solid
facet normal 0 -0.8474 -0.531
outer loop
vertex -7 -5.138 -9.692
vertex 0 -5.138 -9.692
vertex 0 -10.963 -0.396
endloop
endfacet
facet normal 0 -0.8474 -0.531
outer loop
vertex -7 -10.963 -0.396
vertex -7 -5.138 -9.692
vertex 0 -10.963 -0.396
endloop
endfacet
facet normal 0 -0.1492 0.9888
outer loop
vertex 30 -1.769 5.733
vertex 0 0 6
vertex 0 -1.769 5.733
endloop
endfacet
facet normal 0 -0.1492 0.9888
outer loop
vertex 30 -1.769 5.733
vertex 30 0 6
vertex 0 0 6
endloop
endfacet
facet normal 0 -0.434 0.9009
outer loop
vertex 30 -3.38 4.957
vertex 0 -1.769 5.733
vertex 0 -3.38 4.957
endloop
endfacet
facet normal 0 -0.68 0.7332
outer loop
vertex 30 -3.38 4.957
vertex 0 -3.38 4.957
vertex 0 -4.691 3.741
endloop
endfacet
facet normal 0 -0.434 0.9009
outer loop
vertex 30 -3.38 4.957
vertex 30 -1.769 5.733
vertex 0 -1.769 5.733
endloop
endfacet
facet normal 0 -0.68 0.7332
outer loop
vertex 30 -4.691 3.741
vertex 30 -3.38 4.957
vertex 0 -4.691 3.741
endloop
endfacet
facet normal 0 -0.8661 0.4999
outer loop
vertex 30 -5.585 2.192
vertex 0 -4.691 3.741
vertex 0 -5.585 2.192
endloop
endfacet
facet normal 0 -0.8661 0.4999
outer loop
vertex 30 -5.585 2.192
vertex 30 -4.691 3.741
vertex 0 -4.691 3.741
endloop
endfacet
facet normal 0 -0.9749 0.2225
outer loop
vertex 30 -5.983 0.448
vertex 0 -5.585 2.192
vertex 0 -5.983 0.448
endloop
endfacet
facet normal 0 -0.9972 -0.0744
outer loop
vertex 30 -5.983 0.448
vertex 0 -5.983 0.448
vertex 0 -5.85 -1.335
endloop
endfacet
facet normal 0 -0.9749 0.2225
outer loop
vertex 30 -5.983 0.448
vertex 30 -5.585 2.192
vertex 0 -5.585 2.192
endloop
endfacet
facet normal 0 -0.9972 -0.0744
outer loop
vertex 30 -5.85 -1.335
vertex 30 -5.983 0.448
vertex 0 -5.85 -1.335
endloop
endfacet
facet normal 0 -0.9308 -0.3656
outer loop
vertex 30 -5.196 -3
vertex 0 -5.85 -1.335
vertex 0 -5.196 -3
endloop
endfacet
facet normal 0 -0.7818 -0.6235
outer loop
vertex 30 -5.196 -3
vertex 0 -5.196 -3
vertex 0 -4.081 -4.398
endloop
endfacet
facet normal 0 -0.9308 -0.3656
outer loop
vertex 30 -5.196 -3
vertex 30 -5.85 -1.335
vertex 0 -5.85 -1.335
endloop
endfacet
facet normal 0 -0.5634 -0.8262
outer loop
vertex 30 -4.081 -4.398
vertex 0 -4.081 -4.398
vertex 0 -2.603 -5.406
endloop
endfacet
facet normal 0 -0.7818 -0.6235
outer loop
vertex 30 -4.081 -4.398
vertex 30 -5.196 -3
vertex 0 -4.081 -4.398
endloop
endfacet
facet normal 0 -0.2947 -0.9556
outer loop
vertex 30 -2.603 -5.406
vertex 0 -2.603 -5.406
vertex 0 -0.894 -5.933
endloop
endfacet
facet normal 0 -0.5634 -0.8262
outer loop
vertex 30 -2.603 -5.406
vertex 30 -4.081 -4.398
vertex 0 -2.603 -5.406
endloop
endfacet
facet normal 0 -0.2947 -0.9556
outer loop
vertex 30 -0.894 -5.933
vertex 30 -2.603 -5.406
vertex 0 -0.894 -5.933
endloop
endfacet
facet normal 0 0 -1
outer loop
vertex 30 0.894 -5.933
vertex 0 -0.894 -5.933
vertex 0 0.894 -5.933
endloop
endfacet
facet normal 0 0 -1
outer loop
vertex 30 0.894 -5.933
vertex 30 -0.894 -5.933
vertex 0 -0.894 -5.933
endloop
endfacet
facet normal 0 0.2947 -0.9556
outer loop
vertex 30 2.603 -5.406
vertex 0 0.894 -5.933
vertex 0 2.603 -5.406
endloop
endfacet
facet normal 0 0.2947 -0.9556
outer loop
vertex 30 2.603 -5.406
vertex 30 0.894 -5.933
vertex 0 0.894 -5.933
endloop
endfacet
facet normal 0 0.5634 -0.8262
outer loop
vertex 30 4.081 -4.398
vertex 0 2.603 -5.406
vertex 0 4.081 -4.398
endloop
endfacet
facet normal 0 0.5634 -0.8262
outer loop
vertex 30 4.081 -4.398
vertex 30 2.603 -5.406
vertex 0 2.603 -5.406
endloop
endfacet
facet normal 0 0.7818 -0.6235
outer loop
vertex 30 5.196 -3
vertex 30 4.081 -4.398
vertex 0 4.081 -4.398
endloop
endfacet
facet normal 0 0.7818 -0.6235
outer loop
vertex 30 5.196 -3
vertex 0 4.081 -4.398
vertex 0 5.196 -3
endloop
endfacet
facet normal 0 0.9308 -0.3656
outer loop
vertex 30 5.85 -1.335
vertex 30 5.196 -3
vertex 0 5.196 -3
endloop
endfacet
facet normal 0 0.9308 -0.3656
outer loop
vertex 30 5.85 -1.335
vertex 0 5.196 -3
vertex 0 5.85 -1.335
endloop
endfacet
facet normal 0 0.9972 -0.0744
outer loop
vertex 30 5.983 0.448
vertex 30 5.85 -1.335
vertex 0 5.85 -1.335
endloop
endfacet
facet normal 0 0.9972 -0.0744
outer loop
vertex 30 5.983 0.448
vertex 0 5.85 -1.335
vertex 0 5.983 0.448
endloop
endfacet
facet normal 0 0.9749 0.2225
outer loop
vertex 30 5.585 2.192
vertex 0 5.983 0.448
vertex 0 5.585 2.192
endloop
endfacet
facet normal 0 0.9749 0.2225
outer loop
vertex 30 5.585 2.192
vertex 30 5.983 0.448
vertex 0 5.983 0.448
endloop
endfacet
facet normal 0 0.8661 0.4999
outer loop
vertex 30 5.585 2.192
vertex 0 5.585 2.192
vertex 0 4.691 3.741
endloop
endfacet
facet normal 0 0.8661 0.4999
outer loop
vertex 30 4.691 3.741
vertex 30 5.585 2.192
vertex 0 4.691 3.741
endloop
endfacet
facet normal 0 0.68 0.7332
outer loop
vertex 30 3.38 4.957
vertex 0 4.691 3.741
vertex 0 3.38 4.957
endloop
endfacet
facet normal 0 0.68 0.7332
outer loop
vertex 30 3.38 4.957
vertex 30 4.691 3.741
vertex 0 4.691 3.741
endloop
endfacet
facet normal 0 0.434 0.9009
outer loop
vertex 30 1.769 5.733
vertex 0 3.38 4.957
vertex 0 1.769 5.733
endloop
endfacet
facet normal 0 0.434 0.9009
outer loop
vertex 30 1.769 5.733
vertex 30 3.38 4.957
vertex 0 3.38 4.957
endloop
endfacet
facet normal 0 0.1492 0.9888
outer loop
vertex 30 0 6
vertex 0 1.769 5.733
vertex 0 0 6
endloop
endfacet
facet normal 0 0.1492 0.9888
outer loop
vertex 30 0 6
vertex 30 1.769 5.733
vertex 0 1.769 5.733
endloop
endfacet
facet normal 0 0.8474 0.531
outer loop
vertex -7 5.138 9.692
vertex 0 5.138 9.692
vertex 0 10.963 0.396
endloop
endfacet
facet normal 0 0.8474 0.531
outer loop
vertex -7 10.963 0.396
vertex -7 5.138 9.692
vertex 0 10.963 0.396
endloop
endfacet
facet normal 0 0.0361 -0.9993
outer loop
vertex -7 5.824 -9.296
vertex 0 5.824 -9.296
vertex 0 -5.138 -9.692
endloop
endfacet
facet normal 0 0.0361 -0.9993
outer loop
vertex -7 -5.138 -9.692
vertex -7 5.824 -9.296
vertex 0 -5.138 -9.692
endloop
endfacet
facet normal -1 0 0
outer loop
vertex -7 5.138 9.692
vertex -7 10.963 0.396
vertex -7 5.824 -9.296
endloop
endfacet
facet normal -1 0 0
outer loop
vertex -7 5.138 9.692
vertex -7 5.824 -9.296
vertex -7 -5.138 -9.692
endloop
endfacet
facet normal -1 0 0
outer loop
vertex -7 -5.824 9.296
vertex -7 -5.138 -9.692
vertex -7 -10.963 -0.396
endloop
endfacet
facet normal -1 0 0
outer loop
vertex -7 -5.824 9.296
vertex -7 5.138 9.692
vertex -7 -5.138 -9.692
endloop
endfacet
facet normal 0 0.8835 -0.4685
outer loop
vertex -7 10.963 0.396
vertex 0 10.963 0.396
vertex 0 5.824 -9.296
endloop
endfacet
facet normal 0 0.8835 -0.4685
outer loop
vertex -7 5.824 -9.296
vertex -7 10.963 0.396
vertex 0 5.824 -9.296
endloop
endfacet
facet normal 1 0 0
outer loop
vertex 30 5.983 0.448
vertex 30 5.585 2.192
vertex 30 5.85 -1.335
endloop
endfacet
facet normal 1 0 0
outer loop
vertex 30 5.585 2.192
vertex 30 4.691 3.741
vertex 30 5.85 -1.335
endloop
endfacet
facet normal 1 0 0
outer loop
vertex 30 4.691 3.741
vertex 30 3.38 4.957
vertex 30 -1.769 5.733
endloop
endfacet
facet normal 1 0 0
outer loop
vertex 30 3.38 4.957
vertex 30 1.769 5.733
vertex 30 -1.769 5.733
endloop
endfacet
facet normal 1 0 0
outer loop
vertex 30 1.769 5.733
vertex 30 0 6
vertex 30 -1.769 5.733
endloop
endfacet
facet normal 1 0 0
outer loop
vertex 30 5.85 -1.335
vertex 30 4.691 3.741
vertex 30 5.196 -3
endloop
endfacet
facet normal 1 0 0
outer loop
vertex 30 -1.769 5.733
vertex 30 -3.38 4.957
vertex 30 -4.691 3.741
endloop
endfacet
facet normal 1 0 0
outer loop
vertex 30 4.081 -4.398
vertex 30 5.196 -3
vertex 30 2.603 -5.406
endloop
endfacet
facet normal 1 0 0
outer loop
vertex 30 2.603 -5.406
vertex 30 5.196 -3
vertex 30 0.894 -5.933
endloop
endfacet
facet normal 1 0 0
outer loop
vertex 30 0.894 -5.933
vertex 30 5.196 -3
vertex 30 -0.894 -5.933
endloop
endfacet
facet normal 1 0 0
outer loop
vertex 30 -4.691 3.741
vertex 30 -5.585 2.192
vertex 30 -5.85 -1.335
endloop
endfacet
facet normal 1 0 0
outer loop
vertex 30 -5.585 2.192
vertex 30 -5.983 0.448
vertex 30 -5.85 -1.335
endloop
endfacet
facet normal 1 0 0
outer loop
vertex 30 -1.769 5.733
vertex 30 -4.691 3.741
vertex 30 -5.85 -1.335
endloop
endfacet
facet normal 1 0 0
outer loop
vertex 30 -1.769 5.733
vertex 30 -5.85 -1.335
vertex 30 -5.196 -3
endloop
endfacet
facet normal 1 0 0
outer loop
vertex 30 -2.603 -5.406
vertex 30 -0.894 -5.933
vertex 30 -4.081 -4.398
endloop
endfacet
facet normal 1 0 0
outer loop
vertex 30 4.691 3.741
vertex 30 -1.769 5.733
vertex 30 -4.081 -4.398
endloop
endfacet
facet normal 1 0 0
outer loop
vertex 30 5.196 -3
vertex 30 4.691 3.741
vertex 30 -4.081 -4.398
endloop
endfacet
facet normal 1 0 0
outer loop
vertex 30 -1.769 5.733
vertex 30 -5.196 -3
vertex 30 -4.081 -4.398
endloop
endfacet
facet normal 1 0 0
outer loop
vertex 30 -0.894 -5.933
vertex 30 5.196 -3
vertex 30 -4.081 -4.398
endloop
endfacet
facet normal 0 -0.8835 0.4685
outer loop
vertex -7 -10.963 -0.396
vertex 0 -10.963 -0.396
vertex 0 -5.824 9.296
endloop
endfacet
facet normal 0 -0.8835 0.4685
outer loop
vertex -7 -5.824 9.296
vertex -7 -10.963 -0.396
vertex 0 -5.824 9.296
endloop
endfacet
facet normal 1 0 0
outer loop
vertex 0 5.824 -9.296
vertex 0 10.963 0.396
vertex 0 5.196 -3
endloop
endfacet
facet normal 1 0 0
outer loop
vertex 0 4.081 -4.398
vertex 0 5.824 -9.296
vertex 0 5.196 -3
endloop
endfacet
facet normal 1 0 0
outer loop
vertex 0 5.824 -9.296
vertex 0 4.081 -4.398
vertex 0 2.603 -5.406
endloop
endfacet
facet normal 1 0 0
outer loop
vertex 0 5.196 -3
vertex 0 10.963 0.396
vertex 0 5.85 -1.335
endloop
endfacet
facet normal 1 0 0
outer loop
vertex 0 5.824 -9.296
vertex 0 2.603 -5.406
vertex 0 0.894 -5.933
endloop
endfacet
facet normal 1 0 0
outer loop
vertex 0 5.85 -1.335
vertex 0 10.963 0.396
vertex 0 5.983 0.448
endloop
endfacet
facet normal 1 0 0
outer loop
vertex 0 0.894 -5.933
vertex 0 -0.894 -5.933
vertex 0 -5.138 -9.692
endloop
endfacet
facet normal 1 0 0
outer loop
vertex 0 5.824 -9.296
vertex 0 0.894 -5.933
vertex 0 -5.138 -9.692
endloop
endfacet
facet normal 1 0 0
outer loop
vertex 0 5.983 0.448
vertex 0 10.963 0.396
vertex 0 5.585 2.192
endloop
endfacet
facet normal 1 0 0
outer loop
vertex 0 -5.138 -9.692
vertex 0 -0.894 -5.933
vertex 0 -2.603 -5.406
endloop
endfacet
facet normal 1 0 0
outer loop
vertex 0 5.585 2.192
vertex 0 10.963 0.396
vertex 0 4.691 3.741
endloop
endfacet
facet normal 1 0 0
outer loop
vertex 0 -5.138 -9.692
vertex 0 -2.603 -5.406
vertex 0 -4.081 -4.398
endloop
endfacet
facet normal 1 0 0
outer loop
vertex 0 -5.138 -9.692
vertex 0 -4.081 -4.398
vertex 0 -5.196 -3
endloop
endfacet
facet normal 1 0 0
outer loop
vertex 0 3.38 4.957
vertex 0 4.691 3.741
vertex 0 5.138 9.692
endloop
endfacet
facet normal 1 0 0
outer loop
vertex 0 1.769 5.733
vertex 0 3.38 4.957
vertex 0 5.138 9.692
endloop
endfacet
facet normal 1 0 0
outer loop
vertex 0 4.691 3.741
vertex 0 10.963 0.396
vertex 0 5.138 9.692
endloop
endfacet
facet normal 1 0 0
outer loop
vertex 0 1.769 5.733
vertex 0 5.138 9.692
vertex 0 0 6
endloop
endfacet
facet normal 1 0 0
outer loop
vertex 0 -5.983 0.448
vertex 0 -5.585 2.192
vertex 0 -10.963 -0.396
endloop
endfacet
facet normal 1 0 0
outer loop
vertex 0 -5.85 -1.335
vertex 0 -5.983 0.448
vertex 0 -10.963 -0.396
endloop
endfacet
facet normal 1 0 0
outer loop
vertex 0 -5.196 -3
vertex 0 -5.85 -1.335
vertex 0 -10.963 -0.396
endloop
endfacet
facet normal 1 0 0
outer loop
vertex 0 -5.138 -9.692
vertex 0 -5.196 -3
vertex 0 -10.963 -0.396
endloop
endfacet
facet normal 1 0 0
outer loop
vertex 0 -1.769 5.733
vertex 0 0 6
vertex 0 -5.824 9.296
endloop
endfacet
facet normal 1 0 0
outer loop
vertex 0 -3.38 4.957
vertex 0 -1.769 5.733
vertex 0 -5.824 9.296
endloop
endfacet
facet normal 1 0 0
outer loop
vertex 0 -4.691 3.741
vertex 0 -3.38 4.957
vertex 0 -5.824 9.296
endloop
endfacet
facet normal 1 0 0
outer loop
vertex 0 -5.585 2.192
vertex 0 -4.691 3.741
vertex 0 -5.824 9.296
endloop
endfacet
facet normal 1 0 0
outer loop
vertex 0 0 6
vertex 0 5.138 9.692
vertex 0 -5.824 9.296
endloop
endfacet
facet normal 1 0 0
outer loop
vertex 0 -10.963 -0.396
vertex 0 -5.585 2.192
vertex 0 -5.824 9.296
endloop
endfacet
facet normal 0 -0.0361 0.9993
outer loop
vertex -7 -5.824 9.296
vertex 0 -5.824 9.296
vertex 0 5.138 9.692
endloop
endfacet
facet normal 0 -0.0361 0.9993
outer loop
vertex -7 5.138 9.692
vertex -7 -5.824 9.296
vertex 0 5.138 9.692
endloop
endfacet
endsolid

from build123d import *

# Parameters (mm, degrees)
F0_W     = 30
F0_H     = 6
F3_DEPTH = 7


with BuildPart() as f1:
    # F0 (on Front) → F1 (revolve)
    with BuildSketch(Plane.XZ):
        with Locations((15, 3)):
            Rectangle(F0_W, F0_H)
    revolve(axis=Axis((15, 0, 0), (1, 0, 0)))

    # F2 (on face) → F3 (join)
    with BuildSketch(Plane(origin=(0, 0, 0), x_dir=(0, -1, 0), z_dir=(-1, 0, 0))):
        Polygon((10.962513, -0.395784), (5.824015, 9.295923), (-5.138498, 9.691706), (-10.962513, 0.395784), (-5.824015, -9.295923), (5.138498, -9.691706), align=None)
    extrude(amount=F3_DEPTH)


solid = f1.part
